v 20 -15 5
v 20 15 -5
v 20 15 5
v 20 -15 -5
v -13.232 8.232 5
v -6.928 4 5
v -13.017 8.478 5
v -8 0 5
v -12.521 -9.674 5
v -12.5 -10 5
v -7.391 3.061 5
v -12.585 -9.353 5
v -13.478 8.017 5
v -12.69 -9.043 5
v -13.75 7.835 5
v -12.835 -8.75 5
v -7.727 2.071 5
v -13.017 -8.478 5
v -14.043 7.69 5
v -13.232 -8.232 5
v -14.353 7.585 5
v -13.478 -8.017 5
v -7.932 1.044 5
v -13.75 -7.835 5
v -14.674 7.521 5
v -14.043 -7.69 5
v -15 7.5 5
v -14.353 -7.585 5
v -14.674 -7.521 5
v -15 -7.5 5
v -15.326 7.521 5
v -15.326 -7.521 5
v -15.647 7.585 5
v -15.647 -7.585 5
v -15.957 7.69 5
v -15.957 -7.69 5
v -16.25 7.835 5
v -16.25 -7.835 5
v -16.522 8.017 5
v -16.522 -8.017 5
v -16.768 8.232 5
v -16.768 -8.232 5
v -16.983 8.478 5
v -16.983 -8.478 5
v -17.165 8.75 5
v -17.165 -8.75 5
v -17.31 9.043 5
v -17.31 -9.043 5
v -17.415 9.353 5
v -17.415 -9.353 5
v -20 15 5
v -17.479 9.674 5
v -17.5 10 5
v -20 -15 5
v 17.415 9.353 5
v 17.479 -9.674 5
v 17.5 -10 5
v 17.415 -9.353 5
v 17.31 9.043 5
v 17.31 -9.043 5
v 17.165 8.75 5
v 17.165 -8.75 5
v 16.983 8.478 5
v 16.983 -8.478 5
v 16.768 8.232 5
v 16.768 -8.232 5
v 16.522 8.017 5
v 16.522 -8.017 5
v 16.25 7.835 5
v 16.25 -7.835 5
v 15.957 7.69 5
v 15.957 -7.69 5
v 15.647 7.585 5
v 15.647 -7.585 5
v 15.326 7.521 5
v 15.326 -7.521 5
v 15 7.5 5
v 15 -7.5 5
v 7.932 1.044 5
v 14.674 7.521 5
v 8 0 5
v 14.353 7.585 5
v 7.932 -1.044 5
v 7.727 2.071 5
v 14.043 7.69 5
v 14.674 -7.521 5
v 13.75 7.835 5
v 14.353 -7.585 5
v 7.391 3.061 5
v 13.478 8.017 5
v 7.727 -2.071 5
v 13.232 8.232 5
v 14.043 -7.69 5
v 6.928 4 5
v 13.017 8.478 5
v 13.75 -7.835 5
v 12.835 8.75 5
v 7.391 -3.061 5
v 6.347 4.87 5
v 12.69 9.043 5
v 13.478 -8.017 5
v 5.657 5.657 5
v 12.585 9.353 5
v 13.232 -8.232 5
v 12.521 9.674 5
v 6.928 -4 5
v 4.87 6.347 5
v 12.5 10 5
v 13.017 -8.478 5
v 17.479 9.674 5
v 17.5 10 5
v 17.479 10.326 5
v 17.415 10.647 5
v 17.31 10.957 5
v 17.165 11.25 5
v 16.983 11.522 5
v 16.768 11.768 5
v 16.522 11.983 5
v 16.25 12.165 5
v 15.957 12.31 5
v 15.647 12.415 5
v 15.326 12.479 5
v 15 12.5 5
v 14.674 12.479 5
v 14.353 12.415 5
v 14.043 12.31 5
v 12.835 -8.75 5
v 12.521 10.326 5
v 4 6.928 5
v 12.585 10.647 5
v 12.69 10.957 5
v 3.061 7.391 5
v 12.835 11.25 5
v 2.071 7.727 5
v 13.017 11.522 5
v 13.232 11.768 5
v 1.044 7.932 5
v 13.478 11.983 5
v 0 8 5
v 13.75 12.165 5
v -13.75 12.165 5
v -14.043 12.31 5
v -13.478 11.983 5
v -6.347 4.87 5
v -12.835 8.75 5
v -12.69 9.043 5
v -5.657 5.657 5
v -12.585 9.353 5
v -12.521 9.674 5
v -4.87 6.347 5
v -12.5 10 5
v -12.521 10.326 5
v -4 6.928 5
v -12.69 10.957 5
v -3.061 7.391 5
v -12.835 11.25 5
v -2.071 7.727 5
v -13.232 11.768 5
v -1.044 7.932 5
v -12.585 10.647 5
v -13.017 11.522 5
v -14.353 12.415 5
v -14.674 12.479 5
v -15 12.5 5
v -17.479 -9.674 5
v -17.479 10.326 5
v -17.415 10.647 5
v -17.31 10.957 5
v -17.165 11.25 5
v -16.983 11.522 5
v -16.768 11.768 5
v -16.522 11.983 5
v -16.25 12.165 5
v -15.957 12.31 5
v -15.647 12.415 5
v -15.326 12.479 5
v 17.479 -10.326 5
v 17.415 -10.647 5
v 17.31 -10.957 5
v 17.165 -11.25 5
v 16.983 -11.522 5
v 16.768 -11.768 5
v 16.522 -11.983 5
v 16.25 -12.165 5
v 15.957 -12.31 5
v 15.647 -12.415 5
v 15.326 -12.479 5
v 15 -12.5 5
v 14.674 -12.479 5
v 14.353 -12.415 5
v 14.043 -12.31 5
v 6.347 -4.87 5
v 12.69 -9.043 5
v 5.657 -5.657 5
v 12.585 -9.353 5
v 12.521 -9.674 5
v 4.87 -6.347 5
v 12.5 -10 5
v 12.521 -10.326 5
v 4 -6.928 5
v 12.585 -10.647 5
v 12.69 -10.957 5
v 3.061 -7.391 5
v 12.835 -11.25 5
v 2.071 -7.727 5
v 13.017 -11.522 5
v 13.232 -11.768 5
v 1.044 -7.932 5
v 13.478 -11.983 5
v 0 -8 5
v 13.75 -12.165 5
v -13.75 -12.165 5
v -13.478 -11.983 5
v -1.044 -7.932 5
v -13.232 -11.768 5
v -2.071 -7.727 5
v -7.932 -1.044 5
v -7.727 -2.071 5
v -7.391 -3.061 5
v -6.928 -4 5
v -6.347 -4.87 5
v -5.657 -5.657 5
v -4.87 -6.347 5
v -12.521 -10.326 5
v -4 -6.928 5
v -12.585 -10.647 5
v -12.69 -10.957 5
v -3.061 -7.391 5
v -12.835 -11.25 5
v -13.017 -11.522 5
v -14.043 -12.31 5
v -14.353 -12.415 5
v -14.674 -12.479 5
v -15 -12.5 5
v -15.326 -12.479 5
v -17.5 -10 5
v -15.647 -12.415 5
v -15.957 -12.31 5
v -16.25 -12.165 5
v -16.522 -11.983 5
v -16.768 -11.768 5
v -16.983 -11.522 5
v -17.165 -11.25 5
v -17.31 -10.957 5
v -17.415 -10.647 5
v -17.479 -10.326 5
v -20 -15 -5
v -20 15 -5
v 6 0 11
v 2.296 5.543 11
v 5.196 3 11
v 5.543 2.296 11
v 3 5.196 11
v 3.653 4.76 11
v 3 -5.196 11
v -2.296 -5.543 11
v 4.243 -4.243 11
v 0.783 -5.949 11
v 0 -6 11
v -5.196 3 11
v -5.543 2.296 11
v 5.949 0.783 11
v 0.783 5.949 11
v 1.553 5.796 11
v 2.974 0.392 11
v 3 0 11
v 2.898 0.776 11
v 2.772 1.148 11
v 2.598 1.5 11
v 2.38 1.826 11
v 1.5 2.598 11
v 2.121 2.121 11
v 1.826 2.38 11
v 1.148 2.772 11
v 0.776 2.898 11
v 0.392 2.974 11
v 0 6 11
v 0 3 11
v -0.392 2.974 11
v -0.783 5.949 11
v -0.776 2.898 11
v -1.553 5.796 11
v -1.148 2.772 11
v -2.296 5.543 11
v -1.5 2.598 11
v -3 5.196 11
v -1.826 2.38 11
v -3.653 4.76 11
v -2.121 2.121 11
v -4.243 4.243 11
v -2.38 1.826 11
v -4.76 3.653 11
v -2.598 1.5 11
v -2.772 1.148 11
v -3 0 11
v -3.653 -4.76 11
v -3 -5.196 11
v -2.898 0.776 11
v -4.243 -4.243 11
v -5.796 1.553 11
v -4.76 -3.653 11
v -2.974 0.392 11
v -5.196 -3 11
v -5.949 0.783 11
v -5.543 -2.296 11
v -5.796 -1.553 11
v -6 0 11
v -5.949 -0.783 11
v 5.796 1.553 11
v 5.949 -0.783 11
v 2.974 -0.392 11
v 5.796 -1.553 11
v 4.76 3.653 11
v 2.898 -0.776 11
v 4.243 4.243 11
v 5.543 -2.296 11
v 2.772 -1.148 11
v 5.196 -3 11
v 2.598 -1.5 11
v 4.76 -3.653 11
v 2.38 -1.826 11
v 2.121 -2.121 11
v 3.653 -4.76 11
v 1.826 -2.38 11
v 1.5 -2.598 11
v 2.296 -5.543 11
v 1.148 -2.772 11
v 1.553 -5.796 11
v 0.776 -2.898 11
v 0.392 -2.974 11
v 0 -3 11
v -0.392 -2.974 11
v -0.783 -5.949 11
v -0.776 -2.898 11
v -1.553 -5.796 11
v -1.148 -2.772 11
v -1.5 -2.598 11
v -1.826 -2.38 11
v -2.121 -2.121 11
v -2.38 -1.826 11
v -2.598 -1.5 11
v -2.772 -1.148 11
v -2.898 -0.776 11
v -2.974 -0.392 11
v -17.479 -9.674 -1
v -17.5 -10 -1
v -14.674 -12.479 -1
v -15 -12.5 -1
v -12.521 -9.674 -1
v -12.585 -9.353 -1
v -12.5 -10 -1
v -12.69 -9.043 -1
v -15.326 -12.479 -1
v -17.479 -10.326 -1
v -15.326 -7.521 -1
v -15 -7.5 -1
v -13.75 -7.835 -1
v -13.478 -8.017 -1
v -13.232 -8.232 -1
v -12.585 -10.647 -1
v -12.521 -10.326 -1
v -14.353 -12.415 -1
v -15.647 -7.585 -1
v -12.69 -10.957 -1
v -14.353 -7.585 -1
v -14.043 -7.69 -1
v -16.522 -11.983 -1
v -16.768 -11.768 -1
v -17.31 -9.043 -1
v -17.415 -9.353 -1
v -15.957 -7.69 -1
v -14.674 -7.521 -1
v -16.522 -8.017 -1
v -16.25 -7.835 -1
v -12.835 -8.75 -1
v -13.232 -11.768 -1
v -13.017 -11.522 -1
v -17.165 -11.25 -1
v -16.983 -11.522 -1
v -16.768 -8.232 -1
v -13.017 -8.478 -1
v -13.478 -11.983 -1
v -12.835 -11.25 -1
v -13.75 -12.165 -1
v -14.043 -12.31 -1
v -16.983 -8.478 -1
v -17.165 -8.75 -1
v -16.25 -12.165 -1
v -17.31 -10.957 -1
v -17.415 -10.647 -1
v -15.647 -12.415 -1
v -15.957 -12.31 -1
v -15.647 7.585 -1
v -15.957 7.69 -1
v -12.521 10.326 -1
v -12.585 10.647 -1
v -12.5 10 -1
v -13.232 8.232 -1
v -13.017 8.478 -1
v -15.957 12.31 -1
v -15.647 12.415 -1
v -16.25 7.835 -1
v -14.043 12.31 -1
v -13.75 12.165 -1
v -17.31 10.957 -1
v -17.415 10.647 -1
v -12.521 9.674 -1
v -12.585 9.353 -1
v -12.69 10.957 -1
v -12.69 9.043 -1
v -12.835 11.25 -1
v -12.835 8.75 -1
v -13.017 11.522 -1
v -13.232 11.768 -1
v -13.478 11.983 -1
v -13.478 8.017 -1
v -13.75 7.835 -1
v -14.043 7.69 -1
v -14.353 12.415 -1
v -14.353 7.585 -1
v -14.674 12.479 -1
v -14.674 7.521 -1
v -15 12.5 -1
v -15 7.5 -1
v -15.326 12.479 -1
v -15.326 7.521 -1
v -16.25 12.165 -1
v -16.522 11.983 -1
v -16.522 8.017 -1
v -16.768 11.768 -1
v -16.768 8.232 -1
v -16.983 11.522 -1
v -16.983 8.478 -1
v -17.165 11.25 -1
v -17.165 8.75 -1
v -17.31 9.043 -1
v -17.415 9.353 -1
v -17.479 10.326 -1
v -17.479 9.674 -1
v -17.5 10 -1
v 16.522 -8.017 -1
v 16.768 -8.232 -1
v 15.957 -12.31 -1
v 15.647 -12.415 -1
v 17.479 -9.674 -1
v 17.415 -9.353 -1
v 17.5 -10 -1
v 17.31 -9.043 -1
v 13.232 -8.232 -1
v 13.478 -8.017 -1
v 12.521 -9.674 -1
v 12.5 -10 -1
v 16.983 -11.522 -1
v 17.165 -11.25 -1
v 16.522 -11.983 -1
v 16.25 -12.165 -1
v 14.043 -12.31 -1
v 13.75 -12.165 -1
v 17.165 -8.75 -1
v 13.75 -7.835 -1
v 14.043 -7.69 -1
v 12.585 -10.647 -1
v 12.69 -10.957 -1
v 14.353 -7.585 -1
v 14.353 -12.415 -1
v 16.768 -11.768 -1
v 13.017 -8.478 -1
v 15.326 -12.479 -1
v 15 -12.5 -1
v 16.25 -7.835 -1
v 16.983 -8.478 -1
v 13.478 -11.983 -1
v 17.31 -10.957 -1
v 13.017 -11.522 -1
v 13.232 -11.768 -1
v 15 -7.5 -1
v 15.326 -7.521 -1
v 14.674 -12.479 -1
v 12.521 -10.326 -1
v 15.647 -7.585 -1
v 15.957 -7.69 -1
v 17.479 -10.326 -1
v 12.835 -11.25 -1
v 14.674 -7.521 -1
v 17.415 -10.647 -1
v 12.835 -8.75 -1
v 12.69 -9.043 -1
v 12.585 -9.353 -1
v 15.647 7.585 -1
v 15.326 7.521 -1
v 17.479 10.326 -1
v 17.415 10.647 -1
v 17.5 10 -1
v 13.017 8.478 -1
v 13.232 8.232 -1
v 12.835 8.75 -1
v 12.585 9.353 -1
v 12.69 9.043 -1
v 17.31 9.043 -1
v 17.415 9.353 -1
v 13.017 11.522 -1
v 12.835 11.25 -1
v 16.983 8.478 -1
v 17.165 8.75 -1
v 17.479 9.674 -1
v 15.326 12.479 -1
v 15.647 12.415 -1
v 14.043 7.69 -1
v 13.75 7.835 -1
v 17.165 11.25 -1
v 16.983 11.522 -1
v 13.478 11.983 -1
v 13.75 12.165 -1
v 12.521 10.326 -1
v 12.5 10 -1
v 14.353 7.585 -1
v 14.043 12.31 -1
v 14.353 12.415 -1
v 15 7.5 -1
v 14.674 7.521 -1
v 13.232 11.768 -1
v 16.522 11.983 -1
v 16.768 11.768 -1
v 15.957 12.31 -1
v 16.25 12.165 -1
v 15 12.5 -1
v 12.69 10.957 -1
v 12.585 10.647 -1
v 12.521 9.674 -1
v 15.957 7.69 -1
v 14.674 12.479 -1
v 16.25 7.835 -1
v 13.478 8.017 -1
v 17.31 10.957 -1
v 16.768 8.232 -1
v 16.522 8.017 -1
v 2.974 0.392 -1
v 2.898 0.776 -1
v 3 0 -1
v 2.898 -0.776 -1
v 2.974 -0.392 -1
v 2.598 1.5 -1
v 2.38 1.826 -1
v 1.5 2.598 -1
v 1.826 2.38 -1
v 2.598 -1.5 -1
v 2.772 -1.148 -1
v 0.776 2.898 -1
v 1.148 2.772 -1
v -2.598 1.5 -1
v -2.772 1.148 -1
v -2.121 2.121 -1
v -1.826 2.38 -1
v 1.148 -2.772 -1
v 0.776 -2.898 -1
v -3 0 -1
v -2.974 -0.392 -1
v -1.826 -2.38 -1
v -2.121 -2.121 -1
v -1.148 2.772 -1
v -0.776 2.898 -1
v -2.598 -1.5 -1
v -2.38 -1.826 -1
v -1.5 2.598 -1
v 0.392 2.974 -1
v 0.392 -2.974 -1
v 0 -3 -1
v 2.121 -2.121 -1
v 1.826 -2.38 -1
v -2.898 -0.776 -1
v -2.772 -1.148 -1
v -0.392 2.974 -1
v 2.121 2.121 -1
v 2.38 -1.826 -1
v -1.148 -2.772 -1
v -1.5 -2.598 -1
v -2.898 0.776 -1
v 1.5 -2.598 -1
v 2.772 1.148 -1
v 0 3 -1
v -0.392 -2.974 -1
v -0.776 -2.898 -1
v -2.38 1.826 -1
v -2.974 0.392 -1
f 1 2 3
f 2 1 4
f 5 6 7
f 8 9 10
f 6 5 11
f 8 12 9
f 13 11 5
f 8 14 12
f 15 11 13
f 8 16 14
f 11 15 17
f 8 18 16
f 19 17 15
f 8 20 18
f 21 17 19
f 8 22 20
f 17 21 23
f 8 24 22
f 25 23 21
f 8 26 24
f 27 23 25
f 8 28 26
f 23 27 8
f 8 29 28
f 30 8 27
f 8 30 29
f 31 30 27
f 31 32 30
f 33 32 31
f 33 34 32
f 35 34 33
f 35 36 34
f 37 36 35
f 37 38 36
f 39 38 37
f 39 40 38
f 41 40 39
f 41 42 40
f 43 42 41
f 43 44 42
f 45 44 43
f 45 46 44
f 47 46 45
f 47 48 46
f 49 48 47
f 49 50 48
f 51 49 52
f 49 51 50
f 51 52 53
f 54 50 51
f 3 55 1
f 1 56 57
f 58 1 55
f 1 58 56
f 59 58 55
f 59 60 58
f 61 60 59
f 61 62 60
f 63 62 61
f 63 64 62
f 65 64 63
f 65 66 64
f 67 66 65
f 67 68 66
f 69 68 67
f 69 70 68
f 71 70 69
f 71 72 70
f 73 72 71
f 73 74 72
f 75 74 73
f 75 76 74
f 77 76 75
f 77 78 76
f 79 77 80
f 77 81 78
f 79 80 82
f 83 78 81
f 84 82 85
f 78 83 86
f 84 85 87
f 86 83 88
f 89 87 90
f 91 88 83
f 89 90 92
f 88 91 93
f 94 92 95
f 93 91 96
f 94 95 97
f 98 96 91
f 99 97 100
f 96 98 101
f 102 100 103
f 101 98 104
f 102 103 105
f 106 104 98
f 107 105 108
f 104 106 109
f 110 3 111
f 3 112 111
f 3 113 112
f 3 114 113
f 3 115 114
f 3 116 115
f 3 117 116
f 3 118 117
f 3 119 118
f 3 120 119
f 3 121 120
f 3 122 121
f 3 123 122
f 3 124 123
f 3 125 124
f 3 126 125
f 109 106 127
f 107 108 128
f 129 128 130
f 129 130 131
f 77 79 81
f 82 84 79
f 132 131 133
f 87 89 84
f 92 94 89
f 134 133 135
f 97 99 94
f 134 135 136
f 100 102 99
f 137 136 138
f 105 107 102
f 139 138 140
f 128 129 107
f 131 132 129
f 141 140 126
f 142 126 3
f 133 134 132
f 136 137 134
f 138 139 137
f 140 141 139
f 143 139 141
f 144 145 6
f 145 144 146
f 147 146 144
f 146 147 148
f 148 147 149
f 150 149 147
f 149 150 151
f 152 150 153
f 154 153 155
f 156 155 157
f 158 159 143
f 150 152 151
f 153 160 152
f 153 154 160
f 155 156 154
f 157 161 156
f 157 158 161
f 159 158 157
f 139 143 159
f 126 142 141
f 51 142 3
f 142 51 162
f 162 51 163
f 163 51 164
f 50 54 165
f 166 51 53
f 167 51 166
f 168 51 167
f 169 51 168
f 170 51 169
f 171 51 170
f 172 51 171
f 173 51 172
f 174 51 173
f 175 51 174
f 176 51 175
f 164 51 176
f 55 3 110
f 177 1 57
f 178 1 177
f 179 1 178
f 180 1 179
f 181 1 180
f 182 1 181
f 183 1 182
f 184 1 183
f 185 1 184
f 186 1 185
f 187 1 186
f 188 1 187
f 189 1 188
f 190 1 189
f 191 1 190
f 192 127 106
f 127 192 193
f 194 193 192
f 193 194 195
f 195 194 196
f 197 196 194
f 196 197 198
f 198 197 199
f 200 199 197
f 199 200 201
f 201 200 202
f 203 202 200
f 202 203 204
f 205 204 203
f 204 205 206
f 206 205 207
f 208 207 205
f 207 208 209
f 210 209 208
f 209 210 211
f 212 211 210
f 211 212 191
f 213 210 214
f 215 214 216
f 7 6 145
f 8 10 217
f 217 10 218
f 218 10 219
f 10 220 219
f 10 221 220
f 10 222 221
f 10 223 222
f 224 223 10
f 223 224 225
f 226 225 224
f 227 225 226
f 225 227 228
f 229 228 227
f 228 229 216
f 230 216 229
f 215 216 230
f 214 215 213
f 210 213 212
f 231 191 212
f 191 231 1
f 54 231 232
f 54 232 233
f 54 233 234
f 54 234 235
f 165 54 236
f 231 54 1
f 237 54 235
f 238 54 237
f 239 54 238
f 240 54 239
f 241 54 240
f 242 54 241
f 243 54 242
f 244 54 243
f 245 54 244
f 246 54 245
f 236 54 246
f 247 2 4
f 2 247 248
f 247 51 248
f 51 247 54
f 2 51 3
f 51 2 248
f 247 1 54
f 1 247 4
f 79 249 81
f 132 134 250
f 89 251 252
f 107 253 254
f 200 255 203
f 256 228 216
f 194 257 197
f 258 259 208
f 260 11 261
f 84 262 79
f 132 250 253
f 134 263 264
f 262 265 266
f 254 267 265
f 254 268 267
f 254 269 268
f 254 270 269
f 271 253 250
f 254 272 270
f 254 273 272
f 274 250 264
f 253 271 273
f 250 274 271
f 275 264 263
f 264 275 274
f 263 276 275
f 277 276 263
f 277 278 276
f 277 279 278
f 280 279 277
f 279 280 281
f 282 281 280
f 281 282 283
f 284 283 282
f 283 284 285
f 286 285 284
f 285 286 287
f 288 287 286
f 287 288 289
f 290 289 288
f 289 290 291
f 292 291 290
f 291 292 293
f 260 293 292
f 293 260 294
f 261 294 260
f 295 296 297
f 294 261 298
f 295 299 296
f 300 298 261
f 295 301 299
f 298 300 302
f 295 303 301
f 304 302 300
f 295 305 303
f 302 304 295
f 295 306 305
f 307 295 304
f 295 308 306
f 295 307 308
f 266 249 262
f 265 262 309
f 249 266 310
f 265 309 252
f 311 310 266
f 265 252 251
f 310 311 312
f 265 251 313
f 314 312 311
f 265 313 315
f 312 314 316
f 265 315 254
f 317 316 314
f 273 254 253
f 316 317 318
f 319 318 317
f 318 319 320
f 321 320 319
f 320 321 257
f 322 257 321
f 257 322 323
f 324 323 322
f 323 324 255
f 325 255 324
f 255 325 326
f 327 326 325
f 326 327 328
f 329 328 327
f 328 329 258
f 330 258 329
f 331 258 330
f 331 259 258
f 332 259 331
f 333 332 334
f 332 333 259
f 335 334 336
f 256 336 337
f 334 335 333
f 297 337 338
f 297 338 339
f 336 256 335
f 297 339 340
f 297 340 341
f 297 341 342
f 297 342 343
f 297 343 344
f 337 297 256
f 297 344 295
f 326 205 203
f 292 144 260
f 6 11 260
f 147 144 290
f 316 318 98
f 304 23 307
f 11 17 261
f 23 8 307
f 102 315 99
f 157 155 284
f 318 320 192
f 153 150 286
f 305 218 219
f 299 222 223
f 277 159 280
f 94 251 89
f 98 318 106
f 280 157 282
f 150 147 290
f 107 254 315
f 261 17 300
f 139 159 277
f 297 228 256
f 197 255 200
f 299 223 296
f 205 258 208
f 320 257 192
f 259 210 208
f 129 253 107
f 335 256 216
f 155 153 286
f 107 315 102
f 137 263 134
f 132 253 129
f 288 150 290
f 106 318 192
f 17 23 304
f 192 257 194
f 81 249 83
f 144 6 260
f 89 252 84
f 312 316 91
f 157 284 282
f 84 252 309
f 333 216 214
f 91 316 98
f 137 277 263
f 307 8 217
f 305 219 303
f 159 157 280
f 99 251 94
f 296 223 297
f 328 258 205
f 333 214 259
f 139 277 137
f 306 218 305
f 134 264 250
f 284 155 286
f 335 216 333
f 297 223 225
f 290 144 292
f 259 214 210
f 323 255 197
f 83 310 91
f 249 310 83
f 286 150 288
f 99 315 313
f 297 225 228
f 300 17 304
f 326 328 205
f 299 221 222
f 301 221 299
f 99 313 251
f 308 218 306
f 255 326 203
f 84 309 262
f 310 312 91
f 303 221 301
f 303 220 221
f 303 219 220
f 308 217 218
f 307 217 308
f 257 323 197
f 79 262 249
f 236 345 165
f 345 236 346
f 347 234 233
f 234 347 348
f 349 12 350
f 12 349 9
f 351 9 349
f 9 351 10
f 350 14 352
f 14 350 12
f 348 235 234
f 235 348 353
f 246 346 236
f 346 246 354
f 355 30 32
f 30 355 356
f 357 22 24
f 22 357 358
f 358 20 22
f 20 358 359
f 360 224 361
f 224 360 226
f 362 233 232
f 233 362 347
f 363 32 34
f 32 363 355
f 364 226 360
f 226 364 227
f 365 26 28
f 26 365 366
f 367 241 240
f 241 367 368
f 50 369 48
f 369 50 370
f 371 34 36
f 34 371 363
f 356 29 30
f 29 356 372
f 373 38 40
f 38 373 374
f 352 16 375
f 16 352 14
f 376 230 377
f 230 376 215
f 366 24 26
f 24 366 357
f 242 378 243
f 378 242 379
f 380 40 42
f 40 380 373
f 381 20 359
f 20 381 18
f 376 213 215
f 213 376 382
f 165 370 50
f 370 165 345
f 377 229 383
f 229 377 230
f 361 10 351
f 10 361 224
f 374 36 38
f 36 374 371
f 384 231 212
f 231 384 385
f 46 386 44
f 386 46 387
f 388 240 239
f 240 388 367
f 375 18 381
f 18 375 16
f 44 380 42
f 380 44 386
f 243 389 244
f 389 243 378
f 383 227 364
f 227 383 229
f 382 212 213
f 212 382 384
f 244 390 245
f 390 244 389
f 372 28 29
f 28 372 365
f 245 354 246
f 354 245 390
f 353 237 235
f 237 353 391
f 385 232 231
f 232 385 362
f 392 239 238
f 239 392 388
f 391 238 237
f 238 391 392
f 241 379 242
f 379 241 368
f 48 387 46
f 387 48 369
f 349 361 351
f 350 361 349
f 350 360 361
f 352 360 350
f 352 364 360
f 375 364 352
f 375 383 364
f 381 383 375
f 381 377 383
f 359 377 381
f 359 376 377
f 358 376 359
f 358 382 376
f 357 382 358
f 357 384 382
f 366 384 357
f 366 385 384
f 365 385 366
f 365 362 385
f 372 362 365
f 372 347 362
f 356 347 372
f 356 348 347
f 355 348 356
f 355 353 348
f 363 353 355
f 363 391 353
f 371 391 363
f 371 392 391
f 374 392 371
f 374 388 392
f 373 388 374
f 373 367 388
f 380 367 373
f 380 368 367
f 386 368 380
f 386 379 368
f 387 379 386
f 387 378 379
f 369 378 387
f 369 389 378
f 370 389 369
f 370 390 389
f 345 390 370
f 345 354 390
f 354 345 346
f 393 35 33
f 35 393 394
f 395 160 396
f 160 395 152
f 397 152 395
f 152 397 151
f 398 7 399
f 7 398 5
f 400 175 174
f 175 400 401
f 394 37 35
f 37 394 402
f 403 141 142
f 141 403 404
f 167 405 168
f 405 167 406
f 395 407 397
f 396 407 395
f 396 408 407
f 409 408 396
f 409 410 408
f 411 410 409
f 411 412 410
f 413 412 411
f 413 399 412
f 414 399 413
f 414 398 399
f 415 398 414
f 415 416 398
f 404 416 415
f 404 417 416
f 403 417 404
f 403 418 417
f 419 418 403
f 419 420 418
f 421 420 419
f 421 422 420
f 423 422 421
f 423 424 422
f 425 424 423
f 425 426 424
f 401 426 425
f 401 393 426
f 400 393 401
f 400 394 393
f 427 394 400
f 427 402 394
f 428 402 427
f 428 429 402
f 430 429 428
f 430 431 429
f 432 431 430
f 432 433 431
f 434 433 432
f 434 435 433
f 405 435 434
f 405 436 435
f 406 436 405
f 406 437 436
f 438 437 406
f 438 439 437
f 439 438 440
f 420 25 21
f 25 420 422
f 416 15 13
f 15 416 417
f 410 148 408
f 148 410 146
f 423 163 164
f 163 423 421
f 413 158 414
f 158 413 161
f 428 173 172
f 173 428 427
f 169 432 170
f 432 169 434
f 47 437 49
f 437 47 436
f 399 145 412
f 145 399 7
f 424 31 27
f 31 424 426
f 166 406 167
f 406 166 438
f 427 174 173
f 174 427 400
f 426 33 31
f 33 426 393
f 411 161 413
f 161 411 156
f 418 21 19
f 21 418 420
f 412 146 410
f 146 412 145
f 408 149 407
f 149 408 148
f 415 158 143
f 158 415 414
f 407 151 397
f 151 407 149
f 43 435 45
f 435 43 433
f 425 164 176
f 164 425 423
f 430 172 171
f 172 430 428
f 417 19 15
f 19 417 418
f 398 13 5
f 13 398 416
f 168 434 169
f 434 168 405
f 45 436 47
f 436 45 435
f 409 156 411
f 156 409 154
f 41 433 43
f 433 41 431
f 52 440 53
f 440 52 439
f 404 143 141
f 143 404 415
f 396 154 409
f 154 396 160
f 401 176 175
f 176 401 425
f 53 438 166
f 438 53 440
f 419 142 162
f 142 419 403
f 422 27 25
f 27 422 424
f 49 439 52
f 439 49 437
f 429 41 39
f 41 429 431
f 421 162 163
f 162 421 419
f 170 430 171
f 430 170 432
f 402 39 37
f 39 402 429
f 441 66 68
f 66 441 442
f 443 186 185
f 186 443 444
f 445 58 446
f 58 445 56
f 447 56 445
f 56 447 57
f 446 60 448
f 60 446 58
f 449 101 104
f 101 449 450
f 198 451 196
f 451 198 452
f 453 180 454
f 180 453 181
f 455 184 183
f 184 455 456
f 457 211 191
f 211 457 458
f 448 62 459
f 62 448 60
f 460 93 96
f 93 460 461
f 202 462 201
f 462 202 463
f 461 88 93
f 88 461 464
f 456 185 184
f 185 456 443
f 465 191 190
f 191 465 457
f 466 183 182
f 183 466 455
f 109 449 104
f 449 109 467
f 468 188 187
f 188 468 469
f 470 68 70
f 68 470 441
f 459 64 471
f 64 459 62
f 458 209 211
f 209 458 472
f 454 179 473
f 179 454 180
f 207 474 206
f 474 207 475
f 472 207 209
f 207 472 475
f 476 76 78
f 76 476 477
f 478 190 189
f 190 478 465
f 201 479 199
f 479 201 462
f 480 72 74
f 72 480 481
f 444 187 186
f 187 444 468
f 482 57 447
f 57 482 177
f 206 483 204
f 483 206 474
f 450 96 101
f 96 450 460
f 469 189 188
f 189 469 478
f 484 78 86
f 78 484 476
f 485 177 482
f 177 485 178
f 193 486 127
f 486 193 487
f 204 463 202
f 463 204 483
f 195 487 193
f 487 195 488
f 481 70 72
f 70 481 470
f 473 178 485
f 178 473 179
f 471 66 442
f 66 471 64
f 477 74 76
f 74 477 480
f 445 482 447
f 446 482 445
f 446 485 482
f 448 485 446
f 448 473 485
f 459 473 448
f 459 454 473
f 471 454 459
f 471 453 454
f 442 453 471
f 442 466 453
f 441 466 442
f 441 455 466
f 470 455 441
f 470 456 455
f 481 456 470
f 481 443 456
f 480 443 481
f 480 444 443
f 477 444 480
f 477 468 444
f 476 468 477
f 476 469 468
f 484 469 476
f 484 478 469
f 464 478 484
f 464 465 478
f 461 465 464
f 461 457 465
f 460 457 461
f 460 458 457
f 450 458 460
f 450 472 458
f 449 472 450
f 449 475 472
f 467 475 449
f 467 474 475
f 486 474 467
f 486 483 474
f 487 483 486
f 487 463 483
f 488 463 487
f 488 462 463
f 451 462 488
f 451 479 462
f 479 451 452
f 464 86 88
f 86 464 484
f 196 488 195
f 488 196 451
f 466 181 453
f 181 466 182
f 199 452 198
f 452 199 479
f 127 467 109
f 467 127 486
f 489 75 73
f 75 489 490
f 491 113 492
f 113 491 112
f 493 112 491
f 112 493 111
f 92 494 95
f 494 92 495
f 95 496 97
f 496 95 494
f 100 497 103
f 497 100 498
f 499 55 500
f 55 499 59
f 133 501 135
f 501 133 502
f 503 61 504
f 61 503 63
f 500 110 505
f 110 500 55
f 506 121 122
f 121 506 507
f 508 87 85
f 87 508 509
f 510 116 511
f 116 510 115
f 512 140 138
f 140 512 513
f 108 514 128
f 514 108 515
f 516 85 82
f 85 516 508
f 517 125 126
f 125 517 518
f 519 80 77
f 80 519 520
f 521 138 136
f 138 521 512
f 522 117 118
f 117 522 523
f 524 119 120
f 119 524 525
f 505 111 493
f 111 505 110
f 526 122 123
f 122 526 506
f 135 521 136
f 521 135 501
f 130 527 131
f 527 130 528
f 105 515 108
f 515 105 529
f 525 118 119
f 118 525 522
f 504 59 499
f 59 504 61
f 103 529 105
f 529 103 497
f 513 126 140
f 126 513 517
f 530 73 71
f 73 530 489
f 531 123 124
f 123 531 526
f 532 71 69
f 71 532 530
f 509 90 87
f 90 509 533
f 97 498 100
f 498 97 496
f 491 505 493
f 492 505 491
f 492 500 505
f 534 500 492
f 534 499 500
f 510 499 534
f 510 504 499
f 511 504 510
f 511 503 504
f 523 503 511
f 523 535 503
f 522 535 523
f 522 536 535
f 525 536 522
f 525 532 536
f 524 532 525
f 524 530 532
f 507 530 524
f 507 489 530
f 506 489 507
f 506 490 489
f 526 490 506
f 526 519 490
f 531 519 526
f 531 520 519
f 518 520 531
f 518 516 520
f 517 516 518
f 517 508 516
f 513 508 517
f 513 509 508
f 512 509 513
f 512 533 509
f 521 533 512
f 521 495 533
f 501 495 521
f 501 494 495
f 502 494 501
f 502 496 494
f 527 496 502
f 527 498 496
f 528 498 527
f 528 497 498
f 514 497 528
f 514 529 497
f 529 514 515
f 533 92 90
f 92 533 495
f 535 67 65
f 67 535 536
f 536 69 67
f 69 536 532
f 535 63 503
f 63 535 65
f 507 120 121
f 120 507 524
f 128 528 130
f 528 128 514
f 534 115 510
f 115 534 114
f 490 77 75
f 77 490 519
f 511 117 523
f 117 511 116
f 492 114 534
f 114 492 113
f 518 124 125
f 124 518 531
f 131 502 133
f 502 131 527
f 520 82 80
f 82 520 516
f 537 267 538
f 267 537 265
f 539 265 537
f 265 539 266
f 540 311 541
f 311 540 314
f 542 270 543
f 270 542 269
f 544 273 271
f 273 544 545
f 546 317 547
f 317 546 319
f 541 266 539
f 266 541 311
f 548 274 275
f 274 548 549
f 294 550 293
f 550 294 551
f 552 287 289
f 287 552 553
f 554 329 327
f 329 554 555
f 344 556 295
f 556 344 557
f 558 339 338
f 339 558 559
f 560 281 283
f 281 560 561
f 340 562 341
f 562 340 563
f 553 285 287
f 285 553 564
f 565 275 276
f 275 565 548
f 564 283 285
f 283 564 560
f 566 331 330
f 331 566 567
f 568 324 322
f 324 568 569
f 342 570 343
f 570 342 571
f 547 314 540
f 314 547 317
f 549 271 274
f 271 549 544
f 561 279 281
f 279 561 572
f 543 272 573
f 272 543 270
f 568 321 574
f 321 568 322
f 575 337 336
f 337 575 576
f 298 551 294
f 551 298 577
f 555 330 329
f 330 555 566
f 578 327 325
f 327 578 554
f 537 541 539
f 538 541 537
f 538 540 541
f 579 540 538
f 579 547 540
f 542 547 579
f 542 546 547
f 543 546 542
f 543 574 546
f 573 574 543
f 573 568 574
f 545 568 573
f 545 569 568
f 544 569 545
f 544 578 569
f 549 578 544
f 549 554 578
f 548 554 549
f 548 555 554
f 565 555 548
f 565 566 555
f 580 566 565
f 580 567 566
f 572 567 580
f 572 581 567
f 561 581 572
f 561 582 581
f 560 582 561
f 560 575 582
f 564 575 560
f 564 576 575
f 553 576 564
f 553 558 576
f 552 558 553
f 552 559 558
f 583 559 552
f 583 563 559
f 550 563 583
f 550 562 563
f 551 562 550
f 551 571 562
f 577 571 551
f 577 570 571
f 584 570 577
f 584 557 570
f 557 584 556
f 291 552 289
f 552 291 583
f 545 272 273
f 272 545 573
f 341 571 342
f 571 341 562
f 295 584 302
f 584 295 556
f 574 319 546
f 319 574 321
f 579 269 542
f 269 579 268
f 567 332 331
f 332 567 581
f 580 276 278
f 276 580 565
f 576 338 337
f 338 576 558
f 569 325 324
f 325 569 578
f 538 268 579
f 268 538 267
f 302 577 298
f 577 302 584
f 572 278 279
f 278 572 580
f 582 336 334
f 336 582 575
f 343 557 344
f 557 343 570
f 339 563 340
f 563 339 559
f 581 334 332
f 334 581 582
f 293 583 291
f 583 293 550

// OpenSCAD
// A parametric part: a rounded-ish plate with holes and a boss.
$fn = 48;

module hole(x, y, r) {
    translate([x, y, -1])
        cylinder(h = 12, r = r);
}

difference() {
    // base plate
    union() {
        cube([40, 30, 10], center = true);
        // central boss
        translate([0, 0, 5])
            cylinder(h = 6, r1 = 8, r2 = 6);
    }
    // bolt holes at the corners
    for (dx = [-15, 15], dy = [-10, 10])
        hole(dx, dy, 2.5);
    // central bore
    hole(0, 0, 3);
}

echo("plate corners:", 4, "boss height:", 6);
